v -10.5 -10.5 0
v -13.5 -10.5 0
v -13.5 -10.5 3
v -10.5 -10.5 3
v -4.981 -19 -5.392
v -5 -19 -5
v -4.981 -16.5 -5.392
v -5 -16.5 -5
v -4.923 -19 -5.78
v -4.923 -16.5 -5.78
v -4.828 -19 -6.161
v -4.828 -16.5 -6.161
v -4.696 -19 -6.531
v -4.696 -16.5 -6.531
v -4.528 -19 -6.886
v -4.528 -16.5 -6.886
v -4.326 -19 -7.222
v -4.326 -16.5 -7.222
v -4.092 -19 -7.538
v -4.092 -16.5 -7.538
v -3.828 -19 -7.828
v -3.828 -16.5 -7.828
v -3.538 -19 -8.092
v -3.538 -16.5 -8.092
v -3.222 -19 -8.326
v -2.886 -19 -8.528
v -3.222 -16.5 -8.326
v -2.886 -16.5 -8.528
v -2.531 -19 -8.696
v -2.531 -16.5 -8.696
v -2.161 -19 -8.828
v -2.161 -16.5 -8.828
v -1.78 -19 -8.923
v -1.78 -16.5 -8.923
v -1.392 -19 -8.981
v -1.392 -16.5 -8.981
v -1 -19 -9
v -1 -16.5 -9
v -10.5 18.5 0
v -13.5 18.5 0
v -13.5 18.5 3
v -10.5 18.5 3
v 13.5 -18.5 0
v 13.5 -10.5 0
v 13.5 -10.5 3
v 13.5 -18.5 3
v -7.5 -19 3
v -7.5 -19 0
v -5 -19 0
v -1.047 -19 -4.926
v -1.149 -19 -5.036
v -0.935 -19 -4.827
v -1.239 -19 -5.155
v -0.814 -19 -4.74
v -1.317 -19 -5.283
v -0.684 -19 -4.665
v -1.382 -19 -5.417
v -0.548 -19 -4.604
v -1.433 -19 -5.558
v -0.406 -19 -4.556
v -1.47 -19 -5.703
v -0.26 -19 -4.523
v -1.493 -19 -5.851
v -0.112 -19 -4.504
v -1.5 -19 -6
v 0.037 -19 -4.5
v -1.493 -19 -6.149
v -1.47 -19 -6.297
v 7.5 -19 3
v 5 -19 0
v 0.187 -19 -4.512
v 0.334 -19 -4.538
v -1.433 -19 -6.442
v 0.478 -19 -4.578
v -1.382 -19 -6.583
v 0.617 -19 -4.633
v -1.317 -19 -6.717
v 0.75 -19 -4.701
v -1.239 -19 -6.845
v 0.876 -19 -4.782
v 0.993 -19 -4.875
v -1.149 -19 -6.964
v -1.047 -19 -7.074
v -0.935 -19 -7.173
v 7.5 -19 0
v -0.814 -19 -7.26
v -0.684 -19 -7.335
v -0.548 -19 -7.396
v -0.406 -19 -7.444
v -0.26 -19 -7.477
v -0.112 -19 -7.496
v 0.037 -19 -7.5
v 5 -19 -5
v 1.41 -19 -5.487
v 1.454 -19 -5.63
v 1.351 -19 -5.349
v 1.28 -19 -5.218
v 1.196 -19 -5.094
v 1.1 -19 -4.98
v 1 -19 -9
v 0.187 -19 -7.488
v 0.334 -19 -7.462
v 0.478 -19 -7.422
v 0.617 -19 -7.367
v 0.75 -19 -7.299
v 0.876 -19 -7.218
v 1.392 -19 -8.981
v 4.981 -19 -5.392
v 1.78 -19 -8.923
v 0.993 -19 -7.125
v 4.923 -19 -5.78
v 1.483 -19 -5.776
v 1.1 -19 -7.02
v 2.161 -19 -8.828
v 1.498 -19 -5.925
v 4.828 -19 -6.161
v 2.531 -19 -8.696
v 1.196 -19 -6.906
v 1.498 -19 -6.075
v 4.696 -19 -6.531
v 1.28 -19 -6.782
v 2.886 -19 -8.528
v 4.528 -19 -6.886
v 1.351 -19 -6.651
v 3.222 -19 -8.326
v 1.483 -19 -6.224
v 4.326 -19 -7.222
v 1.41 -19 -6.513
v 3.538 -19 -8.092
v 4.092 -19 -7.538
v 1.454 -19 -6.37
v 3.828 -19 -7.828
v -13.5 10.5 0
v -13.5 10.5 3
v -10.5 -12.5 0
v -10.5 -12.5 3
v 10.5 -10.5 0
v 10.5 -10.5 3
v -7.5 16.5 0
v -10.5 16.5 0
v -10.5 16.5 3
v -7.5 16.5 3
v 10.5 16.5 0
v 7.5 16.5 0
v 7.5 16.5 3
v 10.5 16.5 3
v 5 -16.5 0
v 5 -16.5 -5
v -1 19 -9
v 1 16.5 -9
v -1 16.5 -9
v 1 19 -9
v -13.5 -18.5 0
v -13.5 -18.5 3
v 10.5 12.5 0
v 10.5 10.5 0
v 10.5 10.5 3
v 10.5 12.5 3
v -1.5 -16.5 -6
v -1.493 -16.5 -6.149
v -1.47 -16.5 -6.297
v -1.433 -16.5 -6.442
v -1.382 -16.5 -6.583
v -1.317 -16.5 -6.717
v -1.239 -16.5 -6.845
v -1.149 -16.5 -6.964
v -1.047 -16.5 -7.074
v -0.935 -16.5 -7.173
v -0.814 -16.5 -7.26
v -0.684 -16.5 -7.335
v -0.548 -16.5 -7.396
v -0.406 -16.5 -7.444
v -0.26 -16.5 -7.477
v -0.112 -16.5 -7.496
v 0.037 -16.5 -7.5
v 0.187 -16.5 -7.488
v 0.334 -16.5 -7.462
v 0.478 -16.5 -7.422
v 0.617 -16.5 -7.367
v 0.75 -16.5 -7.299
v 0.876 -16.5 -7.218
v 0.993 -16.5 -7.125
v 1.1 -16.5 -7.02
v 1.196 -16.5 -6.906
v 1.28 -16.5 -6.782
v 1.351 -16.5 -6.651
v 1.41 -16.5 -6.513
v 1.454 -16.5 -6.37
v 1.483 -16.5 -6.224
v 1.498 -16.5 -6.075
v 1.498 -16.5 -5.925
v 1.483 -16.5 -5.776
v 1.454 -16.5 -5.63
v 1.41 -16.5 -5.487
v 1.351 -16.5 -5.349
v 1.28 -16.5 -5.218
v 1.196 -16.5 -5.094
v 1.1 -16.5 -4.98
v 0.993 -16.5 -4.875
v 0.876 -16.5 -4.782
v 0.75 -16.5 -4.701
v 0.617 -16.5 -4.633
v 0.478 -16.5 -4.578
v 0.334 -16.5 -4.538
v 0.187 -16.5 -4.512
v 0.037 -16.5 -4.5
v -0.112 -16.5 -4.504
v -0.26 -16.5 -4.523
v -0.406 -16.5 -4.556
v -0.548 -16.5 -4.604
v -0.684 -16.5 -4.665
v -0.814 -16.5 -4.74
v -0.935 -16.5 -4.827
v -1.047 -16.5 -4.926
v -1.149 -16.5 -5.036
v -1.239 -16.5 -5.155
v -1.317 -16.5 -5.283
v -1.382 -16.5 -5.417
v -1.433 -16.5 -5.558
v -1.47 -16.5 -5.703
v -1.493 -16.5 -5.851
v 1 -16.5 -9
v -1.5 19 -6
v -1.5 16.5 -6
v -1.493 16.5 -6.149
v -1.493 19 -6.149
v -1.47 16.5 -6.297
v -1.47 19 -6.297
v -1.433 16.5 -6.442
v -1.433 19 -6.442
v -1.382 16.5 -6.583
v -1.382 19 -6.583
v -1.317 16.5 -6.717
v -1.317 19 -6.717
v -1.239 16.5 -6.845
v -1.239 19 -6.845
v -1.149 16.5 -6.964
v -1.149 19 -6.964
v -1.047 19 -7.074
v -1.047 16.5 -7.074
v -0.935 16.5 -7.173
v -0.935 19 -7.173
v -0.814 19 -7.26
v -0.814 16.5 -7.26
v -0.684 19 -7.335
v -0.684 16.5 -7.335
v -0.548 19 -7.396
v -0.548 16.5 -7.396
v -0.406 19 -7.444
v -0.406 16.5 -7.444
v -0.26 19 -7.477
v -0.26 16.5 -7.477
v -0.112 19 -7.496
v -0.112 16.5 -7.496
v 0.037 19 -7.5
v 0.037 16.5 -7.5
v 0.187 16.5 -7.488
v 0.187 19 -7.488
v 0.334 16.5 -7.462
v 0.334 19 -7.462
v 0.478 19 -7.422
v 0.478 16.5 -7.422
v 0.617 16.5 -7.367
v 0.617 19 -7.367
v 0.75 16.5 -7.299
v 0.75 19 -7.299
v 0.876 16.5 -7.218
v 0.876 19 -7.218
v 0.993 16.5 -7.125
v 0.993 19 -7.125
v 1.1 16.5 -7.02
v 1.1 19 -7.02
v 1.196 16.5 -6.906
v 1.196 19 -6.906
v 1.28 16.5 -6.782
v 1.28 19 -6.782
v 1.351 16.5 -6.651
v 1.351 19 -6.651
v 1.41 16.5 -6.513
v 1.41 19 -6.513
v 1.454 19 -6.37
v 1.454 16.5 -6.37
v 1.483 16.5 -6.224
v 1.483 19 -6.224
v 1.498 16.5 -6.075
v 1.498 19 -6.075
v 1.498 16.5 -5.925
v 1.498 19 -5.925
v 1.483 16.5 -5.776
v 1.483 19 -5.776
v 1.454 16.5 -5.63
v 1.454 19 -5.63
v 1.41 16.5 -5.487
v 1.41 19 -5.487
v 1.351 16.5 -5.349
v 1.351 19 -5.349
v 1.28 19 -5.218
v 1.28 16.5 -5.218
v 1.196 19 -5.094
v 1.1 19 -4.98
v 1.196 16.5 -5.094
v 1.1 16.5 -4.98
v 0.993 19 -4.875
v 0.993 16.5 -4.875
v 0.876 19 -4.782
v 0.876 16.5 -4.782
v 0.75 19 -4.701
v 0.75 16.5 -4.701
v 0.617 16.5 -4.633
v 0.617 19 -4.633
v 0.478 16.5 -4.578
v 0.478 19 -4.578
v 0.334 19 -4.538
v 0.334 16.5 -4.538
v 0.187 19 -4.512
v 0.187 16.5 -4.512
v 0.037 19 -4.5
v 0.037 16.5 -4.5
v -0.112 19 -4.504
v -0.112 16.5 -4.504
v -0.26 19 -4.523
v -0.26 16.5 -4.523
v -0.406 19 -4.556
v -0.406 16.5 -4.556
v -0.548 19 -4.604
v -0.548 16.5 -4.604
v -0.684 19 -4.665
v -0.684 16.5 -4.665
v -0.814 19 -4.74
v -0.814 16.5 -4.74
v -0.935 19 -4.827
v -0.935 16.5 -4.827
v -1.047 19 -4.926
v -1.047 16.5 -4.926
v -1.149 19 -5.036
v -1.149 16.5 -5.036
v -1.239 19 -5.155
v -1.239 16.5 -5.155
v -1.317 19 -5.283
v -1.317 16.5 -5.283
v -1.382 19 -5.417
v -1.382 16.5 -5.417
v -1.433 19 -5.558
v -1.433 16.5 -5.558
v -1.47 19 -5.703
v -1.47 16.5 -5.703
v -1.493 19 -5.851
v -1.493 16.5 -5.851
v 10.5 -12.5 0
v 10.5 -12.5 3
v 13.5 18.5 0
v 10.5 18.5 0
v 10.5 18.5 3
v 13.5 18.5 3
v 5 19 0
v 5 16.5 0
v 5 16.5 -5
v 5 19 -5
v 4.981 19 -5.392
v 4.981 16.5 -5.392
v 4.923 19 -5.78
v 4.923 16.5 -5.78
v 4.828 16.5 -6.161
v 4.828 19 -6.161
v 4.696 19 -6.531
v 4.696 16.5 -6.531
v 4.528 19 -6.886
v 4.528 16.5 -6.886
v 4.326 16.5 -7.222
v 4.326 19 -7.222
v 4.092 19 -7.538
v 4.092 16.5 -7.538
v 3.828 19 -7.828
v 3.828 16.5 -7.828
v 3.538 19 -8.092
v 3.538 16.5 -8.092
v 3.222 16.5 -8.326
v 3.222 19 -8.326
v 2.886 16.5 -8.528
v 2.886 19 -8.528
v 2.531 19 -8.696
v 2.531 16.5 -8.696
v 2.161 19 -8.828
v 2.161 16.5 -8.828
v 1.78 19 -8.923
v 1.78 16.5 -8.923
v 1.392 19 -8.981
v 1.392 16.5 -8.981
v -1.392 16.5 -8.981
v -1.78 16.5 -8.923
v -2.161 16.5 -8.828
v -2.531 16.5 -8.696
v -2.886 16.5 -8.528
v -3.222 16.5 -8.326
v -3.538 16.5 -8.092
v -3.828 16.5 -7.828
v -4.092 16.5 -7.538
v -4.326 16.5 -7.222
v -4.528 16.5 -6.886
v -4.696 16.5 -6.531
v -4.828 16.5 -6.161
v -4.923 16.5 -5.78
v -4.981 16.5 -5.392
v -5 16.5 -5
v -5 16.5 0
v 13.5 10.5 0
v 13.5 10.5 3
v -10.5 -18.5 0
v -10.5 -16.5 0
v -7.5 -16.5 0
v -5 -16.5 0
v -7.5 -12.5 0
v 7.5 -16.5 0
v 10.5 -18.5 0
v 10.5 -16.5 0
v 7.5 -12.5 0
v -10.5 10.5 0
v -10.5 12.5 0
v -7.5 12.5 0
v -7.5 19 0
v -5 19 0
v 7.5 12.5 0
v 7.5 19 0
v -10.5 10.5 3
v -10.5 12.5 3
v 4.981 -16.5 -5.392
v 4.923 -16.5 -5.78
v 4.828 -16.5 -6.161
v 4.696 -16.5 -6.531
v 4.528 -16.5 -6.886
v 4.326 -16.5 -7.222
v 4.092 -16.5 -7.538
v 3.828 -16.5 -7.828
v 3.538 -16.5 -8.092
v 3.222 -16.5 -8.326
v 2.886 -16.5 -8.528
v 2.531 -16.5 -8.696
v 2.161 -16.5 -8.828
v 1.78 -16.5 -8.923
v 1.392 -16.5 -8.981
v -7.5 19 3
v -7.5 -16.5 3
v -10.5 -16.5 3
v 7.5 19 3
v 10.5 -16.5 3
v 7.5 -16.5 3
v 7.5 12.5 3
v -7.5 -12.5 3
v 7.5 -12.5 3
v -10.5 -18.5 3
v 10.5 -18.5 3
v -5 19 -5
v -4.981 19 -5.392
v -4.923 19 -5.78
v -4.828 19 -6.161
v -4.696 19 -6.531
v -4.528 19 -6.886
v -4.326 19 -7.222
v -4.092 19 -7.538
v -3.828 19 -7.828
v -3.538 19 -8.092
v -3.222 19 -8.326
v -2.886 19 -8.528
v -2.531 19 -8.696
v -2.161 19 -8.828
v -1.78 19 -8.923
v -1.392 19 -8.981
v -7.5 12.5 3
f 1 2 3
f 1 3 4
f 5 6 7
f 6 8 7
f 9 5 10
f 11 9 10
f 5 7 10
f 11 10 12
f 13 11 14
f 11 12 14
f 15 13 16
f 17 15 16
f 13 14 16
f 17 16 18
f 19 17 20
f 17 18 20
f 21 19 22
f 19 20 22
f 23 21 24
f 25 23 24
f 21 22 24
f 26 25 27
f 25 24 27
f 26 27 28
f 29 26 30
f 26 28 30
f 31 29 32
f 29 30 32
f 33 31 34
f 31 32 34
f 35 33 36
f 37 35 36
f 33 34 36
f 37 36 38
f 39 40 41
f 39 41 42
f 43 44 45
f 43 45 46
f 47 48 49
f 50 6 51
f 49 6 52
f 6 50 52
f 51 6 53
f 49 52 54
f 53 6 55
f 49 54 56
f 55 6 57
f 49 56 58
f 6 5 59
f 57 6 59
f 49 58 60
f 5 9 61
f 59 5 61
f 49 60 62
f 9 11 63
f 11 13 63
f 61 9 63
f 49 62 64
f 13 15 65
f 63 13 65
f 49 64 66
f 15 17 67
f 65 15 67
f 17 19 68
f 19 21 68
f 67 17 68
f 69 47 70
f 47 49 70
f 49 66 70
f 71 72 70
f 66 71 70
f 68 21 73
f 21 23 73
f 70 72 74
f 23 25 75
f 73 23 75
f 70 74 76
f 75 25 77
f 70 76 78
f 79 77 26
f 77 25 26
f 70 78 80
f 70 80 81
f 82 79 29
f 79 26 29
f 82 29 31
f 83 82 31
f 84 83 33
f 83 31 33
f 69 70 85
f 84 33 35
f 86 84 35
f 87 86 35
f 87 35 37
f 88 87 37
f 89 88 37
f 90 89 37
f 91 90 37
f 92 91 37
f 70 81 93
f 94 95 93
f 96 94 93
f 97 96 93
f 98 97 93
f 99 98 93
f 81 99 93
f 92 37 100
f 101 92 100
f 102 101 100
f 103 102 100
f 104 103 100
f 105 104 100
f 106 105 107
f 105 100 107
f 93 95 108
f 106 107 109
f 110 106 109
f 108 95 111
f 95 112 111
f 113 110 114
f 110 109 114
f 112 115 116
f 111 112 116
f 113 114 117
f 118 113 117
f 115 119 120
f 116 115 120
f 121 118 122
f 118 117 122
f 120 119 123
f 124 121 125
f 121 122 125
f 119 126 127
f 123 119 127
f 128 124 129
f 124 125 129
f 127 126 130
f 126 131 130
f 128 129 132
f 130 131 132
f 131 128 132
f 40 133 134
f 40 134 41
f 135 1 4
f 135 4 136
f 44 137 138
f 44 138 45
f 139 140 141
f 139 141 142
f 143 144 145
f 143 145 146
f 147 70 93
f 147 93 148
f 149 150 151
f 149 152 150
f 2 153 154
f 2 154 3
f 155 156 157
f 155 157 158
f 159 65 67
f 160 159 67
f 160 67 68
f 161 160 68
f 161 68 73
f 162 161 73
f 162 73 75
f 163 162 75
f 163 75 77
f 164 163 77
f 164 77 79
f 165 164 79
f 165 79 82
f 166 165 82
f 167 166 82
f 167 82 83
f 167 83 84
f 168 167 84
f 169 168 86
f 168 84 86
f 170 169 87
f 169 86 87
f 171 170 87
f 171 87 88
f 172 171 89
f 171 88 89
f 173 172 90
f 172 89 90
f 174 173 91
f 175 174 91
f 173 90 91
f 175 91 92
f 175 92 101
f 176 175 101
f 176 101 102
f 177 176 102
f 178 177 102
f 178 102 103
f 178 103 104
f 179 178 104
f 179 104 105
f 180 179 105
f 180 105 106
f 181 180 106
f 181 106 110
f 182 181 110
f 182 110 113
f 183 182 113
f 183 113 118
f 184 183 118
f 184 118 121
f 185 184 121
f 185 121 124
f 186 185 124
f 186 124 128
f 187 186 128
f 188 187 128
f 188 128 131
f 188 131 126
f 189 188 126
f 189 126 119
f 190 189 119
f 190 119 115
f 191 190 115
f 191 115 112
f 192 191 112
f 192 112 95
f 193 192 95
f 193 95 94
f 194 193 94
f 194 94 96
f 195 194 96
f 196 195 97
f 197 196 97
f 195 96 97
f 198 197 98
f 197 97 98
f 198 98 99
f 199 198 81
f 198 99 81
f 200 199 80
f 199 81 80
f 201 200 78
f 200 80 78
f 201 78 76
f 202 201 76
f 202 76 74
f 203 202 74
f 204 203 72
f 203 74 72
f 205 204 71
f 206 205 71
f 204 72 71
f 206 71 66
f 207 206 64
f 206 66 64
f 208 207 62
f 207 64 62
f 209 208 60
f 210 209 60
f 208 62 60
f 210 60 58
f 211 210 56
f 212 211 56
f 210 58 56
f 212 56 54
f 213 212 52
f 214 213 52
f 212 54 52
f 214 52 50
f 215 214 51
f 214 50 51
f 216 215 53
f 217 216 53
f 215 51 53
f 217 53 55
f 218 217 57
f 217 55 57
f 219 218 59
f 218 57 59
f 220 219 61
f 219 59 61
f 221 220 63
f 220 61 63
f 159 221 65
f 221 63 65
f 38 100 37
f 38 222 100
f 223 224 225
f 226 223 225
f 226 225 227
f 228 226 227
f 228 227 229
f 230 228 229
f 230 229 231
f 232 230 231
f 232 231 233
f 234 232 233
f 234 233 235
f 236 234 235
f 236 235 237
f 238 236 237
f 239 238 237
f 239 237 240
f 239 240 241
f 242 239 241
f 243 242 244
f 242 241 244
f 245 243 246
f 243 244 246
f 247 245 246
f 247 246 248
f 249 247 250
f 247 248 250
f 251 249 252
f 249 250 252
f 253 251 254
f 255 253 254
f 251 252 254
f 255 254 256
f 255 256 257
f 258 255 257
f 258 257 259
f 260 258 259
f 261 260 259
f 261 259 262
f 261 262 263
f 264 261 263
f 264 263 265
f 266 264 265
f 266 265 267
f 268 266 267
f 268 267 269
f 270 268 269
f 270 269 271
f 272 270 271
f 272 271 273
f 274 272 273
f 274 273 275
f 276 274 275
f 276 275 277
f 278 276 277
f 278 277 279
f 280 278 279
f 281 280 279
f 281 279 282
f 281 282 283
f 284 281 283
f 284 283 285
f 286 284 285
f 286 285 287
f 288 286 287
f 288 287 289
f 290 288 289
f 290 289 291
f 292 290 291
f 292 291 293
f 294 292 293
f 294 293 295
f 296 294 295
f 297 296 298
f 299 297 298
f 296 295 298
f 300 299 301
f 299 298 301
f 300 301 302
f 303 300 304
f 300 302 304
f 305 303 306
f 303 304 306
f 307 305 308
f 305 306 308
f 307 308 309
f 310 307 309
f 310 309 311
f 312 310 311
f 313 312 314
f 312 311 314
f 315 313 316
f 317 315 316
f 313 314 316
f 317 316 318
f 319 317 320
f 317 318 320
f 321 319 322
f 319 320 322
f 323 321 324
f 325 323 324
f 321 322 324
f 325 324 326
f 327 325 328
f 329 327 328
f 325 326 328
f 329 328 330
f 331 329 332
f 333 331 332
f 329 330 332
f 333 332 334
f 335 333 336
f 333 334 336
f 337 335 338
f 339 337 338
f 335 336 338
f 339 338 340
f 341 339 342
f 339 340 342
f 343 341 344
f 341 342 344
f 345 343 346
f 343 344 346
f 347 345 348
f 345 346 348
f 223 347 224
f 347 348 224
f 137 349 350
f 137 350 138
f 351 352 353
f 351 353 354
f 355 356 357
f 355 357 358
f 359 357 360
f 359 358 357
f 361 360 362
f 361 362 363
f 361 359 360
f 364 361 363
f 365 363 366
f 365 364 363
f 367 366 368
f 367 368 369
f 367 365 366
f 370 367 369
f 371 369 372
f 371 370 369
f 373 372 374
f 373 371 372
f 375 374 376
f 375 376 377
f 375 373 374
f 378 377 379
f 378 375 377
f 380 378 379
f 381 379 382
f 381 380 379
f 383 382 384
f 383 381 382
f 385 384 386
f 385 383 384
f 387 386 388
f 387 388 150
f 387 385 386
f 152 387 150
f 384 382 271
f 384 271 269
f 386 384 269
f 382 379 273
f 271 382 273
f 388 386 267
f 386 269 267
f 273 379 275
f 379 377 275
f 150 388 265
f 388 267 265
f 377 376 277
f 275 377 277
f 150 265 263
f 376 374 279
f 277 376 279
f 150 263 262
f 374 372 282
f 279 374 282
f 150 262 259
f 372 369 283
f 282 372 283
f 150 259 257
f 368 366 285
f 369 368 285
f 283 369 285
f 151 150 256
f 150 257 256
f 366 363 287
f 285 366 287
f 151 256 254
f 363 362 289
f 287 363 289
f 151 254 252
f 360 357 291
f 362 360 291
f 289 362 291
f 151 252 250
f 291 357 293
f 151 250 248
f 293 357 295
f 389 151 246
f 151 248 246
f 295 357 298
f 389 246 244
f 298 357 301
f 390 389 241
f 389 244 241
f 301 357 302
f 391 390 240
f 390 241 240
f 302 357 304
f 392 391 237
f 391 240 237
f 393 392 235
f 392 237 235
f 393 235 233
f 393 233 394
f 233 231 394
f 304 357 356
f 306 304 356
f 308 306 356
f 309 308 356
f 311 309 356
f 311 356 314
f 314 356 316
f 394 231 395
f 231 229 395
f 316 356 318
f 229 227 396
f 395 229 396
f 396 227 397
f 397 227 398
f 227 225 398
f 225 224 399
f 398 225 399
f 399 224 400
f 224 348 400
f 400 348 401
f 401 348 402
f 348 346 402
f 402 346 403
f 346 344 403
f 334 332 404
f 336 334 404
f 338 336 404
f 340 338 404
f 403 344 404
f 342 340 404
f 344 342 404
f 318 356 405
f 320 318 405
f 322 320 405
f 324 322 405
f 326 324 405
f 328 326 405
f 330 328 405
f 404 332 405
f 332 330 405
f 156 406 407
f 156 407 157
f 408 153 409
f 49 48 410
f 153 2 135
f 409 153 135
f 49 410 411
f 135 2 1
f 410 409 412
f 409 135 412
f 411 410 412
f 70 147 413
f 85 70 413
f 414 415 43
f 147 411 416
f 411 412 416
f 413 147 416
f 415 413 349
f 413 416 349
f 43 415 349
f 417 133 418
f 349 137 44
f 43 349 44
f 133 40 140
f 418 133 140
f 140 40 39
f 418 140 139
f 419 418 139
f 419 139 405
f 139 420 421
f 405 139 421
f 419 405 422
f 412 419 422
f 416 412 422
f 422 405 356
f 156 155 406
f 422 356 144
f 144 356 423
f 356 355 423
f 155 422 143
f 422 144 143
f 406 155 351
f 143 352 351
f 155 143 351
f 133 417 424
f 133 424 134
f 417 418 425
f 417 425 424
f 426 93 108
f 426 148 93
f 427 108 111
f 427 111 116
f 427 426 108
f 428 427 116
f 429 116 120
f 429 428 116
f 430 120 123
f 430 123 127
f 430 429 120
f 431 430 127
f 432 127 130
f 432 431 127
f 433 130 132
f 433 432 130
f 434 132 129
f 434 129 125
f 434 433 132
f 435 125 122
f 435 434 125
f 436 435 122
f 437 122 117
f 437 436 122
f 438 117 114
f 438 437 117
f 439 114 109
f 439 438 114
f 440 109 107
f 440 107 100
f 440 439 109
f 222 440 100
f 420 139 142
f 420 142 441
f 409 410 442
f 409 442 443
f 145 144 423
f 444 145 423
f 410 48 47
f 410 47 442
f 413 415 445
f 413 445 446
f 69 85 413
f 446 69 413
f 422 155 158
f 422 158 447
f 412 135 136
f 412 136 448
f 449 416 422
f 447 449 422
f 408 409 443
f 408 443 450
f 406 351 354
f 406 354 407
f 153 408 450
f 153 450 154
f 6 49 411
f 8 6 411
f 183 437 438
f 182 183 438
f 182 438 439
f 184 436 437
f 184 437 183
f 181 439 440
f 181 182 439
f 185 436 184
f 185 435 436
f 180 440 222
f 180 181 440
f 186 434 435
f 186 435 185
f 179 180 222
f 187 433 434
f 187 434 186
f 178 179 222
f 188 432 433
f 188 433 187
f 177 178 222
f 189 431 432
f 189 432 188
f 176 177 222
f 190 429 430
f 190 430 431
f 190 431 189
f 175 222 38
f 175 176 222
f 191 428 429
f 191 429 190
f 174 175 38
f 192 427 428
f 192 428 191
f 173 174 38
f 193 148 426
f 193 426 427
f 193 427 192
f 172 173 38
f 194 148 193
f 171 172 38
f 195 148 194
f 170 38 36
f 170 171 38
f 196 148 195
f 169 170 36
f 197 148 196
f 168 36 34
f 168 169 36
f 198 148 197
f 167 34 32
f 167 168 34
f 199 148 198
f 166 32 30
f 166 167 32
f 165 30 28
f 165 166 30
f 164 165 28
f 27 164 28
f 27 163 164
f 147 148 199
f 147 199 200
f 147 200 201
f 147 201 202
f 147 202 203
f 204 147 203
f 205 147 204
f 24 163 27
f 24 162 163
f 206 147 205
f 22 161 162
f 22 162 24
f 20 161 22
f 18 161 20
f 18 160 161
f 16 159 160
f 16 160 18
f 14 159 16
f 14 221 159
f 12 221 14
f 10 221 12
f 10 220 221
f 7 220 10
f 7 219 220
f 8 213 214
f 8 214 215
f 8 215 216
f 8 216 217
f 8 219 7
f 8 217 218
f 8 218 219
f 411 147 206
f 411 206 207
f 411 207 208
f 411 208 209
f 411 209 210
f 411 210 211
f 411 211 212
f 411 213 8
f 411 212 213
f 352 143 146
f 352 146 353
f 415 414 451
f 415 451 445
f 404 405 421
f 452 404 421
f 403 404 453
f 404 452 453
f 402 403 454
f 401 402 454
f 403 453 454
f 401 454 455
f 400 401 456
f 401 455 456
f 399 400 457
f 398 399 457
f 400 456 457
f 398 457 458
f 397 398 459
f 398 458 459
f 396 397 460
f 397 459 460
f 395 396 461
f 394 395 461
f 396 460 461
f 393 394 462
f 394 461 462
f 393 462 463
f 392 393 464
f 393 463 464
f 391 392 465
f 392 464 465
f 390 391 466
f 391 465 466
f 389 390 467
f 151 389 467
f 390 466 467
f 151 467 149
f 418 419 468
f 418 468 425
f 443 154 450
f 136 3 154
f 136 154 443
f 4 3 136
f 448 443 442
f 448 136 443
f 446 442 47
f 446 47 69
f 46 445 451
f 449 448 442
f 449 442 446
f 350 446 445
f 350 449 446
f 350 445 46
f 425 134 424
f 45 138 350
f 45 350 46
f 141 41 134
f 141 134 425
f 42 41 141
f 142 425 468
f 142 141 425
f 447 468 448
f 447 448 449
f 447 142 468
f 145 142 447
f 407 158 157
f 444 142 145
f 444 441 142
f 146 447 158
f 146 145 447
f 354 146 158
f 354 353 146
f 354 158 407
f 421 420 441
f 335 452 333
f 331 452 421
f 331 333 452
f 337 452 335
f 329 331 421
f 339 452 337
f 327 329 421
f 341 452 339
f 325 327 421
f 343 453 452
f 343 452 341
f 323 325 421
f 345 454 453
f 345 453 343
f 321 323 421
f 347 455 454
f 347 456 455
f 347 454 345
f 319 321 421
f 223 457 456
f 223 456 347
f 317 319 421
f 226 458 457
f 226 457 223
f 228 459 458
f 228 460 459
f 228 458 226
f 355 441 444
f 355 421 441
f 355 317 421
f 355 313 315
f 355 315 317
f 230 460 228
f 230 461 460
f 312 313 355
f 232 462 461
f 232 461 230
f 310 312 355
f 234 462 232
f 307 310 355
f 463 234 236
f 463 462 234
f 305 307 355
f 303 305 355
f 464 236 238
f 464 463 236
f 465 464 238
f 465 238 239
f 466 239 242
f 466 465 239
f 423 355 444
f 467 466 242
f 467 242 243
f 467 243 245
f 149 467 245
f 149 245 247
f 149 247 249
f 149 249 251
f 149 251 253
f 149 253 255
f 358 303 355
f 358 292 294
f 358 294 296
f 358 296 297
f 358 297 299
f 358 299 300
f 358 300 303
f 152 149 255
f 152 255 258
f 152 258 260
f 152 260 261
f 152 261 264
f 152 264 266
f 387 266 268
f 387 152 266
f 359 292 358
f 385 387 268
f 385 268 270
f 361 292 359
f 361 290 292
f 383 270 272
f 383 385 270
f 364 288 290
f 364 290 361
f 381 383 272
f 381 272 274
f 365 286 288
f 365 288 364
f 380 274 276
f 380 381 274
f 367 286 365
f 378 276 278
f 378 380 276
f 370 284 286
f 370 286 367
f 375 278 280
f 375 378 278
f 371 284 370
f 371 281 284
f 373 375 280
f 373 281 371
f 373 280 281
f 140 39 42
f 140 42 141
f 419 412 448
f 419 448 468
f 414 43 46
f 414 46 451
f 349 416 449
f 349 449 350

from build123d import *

# Parameters (mm, degrees)
SKETCH_1_W            = 15
SKETCH_1_H            = 38
EXTRUDE_1_DEPTH       = 3
EXTRUDE_4_DEPTH       = 3
SKETCH_6_W            = 10
SKETCH_6_H            = 2.5
EXTRUDE_5_DEPTH       = 9
HOLE_WIZARD_3_0_3_1_D = 3
FILLET_1_R            = 4


with BuildPart() as part:
    # 스케치1 → 보스-돌출1 (new body)
    with BuildSketch(Plane.XY):
        Rectangle(SKETCH_1_W, SKETCH_1_H)
    extrude(amount=EXTRUDE_1_DEPTH)

    # 스케치5 → 보스-돌출4 (add)
    with BuildSketch(Plane(origin=(0, 0, 0), x_dir=(-1, 0, 0), z_dir=(0, 0, -1))):
        Polygon((-7.5, 16.5), (-10.5, 16.5), (-10.5, 18.5), (-13.5, 18.5), (-13.5, 10.5), (-10.5, 10.5), (-10.5, 12.5), (-7.5, 12.5), align=None)
        Polygon((7.5, 16.5), (7.5, 12.5), (10.5, 12.5), (10.5, 10.5), (13.5, 10.5), (13.5, 18.5), (10.5, 18.5), (10.5, 16.5), align=None)
        Polygon((7.5, -16.5), (10.5, -16.5), (10.5, -18.5), (13.5, -18.5), (13.5, -10.5), (10.5, -10.5), (10.5, -12.5), (7.5, -12.5), align=None)
        Polygon((-7.5, -16.5), (-7.5, -12.5), (-10.5, -12.5), (-10.5, -10.5), (-13.5, -10.5), (-13.5, -18.5), (-10.5, -18.5), (-10.5, -16.5), align=None)
    extrude(amount=-EXTRUDE_4_DEPTH)

    # 스케치6 → 보스-돌출5 (add)
    with BuildSketch(Plane(origin=(0, 0, 0), x_dir=(-1, 0, 0), z_dir=(0, 0, -1))):
        with Locations((0, 17.75)):
            Rectangle(SKETCH_6_W, SKETCH_6_H)
        with Locations((0, -17.75)):
            Rectangle(SKETCH_6_W, SKETCH_6_H)
    extrude(amount=EXTRUDE_5_DEPTH)

    # Ø3.0 (3) 지름 구멍1 (through all)
    with Locations(Plane(origin=(0, 19, 0), x_dir=(1, 0, 0), z_dir=(0, 1, 0))):
        with Locations((0, 6)):
            Hole(HOLE_WIZARD_3_0_3_1_D / 2)

    # 필렛1
    fillet_1_edges = [part.edges().sort_by_distance(p)[0] for p in [
        (5, 17.75, -9),
        (-5, 17.75, -9),
        (-5, -17.75, -9),
        (5, -17.75, -9),
    ]]
    fillet(fillet_1_edges, radius=FILLET_1_R)


solid = part.part
